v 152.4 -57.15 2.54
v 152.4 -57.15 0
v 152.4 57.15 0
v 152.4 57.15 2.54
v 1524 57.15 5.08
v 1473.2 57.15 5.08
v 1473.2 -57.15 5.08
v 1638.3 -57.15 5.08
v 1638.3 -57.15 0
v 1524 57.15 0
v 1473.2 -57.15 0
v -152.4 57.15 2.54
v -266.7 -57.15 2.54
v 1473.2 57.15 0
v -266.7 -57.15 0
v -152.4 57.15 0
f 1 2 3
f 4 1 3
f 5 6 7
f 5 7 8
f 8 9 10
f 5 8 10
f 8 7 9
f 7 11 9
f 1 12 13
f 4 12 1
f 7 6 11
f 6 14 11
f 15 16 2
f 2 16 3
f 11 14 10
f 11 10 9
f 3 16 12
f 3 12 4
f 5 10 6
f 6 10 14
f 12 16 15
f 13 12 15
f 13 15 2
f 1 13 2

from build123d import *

# Parameters (mm, degrees)
F0_W     = 50.8
F0_H     = 114.3
F0_W_2   = 304.8
F1_DEPTH = 2.54
F2_DEPTH = 2.54


with BuildPart() as f1:
    # F0 (on Top) → F1 (new body)
    with BuildSketch(Plane.XY):
        with Locations((1498.6, 0)):
            Rectangle(F0_W, F0_H)
        Rectangle(F0_W_2, F0_H)
        Polygon((-266.7, -57.15), (-152.4, -57.15), (-152.4, 57.15), align=None)
        Polygon((1638.3, -57.15), (1524, 57.15), (1524, -57.15), align=None)
    extrude(amount=F1_DEPTH)

    # F1_face (on face) → F2 (join)
    with BuildSketch(Plane(origin=(1532.217647, -10.085294, 2.54), x_dir=(1, 0, 0), z_dir=(0, 0, 1))):
        Polygon((-8.217647, 67.235294), (-59.017647, 67.235294), (-59.017647, -47.064706), (106.082353, -47.064706), align=None)
    extrude(amount=F2_DEPTH)


solid = f1.part
